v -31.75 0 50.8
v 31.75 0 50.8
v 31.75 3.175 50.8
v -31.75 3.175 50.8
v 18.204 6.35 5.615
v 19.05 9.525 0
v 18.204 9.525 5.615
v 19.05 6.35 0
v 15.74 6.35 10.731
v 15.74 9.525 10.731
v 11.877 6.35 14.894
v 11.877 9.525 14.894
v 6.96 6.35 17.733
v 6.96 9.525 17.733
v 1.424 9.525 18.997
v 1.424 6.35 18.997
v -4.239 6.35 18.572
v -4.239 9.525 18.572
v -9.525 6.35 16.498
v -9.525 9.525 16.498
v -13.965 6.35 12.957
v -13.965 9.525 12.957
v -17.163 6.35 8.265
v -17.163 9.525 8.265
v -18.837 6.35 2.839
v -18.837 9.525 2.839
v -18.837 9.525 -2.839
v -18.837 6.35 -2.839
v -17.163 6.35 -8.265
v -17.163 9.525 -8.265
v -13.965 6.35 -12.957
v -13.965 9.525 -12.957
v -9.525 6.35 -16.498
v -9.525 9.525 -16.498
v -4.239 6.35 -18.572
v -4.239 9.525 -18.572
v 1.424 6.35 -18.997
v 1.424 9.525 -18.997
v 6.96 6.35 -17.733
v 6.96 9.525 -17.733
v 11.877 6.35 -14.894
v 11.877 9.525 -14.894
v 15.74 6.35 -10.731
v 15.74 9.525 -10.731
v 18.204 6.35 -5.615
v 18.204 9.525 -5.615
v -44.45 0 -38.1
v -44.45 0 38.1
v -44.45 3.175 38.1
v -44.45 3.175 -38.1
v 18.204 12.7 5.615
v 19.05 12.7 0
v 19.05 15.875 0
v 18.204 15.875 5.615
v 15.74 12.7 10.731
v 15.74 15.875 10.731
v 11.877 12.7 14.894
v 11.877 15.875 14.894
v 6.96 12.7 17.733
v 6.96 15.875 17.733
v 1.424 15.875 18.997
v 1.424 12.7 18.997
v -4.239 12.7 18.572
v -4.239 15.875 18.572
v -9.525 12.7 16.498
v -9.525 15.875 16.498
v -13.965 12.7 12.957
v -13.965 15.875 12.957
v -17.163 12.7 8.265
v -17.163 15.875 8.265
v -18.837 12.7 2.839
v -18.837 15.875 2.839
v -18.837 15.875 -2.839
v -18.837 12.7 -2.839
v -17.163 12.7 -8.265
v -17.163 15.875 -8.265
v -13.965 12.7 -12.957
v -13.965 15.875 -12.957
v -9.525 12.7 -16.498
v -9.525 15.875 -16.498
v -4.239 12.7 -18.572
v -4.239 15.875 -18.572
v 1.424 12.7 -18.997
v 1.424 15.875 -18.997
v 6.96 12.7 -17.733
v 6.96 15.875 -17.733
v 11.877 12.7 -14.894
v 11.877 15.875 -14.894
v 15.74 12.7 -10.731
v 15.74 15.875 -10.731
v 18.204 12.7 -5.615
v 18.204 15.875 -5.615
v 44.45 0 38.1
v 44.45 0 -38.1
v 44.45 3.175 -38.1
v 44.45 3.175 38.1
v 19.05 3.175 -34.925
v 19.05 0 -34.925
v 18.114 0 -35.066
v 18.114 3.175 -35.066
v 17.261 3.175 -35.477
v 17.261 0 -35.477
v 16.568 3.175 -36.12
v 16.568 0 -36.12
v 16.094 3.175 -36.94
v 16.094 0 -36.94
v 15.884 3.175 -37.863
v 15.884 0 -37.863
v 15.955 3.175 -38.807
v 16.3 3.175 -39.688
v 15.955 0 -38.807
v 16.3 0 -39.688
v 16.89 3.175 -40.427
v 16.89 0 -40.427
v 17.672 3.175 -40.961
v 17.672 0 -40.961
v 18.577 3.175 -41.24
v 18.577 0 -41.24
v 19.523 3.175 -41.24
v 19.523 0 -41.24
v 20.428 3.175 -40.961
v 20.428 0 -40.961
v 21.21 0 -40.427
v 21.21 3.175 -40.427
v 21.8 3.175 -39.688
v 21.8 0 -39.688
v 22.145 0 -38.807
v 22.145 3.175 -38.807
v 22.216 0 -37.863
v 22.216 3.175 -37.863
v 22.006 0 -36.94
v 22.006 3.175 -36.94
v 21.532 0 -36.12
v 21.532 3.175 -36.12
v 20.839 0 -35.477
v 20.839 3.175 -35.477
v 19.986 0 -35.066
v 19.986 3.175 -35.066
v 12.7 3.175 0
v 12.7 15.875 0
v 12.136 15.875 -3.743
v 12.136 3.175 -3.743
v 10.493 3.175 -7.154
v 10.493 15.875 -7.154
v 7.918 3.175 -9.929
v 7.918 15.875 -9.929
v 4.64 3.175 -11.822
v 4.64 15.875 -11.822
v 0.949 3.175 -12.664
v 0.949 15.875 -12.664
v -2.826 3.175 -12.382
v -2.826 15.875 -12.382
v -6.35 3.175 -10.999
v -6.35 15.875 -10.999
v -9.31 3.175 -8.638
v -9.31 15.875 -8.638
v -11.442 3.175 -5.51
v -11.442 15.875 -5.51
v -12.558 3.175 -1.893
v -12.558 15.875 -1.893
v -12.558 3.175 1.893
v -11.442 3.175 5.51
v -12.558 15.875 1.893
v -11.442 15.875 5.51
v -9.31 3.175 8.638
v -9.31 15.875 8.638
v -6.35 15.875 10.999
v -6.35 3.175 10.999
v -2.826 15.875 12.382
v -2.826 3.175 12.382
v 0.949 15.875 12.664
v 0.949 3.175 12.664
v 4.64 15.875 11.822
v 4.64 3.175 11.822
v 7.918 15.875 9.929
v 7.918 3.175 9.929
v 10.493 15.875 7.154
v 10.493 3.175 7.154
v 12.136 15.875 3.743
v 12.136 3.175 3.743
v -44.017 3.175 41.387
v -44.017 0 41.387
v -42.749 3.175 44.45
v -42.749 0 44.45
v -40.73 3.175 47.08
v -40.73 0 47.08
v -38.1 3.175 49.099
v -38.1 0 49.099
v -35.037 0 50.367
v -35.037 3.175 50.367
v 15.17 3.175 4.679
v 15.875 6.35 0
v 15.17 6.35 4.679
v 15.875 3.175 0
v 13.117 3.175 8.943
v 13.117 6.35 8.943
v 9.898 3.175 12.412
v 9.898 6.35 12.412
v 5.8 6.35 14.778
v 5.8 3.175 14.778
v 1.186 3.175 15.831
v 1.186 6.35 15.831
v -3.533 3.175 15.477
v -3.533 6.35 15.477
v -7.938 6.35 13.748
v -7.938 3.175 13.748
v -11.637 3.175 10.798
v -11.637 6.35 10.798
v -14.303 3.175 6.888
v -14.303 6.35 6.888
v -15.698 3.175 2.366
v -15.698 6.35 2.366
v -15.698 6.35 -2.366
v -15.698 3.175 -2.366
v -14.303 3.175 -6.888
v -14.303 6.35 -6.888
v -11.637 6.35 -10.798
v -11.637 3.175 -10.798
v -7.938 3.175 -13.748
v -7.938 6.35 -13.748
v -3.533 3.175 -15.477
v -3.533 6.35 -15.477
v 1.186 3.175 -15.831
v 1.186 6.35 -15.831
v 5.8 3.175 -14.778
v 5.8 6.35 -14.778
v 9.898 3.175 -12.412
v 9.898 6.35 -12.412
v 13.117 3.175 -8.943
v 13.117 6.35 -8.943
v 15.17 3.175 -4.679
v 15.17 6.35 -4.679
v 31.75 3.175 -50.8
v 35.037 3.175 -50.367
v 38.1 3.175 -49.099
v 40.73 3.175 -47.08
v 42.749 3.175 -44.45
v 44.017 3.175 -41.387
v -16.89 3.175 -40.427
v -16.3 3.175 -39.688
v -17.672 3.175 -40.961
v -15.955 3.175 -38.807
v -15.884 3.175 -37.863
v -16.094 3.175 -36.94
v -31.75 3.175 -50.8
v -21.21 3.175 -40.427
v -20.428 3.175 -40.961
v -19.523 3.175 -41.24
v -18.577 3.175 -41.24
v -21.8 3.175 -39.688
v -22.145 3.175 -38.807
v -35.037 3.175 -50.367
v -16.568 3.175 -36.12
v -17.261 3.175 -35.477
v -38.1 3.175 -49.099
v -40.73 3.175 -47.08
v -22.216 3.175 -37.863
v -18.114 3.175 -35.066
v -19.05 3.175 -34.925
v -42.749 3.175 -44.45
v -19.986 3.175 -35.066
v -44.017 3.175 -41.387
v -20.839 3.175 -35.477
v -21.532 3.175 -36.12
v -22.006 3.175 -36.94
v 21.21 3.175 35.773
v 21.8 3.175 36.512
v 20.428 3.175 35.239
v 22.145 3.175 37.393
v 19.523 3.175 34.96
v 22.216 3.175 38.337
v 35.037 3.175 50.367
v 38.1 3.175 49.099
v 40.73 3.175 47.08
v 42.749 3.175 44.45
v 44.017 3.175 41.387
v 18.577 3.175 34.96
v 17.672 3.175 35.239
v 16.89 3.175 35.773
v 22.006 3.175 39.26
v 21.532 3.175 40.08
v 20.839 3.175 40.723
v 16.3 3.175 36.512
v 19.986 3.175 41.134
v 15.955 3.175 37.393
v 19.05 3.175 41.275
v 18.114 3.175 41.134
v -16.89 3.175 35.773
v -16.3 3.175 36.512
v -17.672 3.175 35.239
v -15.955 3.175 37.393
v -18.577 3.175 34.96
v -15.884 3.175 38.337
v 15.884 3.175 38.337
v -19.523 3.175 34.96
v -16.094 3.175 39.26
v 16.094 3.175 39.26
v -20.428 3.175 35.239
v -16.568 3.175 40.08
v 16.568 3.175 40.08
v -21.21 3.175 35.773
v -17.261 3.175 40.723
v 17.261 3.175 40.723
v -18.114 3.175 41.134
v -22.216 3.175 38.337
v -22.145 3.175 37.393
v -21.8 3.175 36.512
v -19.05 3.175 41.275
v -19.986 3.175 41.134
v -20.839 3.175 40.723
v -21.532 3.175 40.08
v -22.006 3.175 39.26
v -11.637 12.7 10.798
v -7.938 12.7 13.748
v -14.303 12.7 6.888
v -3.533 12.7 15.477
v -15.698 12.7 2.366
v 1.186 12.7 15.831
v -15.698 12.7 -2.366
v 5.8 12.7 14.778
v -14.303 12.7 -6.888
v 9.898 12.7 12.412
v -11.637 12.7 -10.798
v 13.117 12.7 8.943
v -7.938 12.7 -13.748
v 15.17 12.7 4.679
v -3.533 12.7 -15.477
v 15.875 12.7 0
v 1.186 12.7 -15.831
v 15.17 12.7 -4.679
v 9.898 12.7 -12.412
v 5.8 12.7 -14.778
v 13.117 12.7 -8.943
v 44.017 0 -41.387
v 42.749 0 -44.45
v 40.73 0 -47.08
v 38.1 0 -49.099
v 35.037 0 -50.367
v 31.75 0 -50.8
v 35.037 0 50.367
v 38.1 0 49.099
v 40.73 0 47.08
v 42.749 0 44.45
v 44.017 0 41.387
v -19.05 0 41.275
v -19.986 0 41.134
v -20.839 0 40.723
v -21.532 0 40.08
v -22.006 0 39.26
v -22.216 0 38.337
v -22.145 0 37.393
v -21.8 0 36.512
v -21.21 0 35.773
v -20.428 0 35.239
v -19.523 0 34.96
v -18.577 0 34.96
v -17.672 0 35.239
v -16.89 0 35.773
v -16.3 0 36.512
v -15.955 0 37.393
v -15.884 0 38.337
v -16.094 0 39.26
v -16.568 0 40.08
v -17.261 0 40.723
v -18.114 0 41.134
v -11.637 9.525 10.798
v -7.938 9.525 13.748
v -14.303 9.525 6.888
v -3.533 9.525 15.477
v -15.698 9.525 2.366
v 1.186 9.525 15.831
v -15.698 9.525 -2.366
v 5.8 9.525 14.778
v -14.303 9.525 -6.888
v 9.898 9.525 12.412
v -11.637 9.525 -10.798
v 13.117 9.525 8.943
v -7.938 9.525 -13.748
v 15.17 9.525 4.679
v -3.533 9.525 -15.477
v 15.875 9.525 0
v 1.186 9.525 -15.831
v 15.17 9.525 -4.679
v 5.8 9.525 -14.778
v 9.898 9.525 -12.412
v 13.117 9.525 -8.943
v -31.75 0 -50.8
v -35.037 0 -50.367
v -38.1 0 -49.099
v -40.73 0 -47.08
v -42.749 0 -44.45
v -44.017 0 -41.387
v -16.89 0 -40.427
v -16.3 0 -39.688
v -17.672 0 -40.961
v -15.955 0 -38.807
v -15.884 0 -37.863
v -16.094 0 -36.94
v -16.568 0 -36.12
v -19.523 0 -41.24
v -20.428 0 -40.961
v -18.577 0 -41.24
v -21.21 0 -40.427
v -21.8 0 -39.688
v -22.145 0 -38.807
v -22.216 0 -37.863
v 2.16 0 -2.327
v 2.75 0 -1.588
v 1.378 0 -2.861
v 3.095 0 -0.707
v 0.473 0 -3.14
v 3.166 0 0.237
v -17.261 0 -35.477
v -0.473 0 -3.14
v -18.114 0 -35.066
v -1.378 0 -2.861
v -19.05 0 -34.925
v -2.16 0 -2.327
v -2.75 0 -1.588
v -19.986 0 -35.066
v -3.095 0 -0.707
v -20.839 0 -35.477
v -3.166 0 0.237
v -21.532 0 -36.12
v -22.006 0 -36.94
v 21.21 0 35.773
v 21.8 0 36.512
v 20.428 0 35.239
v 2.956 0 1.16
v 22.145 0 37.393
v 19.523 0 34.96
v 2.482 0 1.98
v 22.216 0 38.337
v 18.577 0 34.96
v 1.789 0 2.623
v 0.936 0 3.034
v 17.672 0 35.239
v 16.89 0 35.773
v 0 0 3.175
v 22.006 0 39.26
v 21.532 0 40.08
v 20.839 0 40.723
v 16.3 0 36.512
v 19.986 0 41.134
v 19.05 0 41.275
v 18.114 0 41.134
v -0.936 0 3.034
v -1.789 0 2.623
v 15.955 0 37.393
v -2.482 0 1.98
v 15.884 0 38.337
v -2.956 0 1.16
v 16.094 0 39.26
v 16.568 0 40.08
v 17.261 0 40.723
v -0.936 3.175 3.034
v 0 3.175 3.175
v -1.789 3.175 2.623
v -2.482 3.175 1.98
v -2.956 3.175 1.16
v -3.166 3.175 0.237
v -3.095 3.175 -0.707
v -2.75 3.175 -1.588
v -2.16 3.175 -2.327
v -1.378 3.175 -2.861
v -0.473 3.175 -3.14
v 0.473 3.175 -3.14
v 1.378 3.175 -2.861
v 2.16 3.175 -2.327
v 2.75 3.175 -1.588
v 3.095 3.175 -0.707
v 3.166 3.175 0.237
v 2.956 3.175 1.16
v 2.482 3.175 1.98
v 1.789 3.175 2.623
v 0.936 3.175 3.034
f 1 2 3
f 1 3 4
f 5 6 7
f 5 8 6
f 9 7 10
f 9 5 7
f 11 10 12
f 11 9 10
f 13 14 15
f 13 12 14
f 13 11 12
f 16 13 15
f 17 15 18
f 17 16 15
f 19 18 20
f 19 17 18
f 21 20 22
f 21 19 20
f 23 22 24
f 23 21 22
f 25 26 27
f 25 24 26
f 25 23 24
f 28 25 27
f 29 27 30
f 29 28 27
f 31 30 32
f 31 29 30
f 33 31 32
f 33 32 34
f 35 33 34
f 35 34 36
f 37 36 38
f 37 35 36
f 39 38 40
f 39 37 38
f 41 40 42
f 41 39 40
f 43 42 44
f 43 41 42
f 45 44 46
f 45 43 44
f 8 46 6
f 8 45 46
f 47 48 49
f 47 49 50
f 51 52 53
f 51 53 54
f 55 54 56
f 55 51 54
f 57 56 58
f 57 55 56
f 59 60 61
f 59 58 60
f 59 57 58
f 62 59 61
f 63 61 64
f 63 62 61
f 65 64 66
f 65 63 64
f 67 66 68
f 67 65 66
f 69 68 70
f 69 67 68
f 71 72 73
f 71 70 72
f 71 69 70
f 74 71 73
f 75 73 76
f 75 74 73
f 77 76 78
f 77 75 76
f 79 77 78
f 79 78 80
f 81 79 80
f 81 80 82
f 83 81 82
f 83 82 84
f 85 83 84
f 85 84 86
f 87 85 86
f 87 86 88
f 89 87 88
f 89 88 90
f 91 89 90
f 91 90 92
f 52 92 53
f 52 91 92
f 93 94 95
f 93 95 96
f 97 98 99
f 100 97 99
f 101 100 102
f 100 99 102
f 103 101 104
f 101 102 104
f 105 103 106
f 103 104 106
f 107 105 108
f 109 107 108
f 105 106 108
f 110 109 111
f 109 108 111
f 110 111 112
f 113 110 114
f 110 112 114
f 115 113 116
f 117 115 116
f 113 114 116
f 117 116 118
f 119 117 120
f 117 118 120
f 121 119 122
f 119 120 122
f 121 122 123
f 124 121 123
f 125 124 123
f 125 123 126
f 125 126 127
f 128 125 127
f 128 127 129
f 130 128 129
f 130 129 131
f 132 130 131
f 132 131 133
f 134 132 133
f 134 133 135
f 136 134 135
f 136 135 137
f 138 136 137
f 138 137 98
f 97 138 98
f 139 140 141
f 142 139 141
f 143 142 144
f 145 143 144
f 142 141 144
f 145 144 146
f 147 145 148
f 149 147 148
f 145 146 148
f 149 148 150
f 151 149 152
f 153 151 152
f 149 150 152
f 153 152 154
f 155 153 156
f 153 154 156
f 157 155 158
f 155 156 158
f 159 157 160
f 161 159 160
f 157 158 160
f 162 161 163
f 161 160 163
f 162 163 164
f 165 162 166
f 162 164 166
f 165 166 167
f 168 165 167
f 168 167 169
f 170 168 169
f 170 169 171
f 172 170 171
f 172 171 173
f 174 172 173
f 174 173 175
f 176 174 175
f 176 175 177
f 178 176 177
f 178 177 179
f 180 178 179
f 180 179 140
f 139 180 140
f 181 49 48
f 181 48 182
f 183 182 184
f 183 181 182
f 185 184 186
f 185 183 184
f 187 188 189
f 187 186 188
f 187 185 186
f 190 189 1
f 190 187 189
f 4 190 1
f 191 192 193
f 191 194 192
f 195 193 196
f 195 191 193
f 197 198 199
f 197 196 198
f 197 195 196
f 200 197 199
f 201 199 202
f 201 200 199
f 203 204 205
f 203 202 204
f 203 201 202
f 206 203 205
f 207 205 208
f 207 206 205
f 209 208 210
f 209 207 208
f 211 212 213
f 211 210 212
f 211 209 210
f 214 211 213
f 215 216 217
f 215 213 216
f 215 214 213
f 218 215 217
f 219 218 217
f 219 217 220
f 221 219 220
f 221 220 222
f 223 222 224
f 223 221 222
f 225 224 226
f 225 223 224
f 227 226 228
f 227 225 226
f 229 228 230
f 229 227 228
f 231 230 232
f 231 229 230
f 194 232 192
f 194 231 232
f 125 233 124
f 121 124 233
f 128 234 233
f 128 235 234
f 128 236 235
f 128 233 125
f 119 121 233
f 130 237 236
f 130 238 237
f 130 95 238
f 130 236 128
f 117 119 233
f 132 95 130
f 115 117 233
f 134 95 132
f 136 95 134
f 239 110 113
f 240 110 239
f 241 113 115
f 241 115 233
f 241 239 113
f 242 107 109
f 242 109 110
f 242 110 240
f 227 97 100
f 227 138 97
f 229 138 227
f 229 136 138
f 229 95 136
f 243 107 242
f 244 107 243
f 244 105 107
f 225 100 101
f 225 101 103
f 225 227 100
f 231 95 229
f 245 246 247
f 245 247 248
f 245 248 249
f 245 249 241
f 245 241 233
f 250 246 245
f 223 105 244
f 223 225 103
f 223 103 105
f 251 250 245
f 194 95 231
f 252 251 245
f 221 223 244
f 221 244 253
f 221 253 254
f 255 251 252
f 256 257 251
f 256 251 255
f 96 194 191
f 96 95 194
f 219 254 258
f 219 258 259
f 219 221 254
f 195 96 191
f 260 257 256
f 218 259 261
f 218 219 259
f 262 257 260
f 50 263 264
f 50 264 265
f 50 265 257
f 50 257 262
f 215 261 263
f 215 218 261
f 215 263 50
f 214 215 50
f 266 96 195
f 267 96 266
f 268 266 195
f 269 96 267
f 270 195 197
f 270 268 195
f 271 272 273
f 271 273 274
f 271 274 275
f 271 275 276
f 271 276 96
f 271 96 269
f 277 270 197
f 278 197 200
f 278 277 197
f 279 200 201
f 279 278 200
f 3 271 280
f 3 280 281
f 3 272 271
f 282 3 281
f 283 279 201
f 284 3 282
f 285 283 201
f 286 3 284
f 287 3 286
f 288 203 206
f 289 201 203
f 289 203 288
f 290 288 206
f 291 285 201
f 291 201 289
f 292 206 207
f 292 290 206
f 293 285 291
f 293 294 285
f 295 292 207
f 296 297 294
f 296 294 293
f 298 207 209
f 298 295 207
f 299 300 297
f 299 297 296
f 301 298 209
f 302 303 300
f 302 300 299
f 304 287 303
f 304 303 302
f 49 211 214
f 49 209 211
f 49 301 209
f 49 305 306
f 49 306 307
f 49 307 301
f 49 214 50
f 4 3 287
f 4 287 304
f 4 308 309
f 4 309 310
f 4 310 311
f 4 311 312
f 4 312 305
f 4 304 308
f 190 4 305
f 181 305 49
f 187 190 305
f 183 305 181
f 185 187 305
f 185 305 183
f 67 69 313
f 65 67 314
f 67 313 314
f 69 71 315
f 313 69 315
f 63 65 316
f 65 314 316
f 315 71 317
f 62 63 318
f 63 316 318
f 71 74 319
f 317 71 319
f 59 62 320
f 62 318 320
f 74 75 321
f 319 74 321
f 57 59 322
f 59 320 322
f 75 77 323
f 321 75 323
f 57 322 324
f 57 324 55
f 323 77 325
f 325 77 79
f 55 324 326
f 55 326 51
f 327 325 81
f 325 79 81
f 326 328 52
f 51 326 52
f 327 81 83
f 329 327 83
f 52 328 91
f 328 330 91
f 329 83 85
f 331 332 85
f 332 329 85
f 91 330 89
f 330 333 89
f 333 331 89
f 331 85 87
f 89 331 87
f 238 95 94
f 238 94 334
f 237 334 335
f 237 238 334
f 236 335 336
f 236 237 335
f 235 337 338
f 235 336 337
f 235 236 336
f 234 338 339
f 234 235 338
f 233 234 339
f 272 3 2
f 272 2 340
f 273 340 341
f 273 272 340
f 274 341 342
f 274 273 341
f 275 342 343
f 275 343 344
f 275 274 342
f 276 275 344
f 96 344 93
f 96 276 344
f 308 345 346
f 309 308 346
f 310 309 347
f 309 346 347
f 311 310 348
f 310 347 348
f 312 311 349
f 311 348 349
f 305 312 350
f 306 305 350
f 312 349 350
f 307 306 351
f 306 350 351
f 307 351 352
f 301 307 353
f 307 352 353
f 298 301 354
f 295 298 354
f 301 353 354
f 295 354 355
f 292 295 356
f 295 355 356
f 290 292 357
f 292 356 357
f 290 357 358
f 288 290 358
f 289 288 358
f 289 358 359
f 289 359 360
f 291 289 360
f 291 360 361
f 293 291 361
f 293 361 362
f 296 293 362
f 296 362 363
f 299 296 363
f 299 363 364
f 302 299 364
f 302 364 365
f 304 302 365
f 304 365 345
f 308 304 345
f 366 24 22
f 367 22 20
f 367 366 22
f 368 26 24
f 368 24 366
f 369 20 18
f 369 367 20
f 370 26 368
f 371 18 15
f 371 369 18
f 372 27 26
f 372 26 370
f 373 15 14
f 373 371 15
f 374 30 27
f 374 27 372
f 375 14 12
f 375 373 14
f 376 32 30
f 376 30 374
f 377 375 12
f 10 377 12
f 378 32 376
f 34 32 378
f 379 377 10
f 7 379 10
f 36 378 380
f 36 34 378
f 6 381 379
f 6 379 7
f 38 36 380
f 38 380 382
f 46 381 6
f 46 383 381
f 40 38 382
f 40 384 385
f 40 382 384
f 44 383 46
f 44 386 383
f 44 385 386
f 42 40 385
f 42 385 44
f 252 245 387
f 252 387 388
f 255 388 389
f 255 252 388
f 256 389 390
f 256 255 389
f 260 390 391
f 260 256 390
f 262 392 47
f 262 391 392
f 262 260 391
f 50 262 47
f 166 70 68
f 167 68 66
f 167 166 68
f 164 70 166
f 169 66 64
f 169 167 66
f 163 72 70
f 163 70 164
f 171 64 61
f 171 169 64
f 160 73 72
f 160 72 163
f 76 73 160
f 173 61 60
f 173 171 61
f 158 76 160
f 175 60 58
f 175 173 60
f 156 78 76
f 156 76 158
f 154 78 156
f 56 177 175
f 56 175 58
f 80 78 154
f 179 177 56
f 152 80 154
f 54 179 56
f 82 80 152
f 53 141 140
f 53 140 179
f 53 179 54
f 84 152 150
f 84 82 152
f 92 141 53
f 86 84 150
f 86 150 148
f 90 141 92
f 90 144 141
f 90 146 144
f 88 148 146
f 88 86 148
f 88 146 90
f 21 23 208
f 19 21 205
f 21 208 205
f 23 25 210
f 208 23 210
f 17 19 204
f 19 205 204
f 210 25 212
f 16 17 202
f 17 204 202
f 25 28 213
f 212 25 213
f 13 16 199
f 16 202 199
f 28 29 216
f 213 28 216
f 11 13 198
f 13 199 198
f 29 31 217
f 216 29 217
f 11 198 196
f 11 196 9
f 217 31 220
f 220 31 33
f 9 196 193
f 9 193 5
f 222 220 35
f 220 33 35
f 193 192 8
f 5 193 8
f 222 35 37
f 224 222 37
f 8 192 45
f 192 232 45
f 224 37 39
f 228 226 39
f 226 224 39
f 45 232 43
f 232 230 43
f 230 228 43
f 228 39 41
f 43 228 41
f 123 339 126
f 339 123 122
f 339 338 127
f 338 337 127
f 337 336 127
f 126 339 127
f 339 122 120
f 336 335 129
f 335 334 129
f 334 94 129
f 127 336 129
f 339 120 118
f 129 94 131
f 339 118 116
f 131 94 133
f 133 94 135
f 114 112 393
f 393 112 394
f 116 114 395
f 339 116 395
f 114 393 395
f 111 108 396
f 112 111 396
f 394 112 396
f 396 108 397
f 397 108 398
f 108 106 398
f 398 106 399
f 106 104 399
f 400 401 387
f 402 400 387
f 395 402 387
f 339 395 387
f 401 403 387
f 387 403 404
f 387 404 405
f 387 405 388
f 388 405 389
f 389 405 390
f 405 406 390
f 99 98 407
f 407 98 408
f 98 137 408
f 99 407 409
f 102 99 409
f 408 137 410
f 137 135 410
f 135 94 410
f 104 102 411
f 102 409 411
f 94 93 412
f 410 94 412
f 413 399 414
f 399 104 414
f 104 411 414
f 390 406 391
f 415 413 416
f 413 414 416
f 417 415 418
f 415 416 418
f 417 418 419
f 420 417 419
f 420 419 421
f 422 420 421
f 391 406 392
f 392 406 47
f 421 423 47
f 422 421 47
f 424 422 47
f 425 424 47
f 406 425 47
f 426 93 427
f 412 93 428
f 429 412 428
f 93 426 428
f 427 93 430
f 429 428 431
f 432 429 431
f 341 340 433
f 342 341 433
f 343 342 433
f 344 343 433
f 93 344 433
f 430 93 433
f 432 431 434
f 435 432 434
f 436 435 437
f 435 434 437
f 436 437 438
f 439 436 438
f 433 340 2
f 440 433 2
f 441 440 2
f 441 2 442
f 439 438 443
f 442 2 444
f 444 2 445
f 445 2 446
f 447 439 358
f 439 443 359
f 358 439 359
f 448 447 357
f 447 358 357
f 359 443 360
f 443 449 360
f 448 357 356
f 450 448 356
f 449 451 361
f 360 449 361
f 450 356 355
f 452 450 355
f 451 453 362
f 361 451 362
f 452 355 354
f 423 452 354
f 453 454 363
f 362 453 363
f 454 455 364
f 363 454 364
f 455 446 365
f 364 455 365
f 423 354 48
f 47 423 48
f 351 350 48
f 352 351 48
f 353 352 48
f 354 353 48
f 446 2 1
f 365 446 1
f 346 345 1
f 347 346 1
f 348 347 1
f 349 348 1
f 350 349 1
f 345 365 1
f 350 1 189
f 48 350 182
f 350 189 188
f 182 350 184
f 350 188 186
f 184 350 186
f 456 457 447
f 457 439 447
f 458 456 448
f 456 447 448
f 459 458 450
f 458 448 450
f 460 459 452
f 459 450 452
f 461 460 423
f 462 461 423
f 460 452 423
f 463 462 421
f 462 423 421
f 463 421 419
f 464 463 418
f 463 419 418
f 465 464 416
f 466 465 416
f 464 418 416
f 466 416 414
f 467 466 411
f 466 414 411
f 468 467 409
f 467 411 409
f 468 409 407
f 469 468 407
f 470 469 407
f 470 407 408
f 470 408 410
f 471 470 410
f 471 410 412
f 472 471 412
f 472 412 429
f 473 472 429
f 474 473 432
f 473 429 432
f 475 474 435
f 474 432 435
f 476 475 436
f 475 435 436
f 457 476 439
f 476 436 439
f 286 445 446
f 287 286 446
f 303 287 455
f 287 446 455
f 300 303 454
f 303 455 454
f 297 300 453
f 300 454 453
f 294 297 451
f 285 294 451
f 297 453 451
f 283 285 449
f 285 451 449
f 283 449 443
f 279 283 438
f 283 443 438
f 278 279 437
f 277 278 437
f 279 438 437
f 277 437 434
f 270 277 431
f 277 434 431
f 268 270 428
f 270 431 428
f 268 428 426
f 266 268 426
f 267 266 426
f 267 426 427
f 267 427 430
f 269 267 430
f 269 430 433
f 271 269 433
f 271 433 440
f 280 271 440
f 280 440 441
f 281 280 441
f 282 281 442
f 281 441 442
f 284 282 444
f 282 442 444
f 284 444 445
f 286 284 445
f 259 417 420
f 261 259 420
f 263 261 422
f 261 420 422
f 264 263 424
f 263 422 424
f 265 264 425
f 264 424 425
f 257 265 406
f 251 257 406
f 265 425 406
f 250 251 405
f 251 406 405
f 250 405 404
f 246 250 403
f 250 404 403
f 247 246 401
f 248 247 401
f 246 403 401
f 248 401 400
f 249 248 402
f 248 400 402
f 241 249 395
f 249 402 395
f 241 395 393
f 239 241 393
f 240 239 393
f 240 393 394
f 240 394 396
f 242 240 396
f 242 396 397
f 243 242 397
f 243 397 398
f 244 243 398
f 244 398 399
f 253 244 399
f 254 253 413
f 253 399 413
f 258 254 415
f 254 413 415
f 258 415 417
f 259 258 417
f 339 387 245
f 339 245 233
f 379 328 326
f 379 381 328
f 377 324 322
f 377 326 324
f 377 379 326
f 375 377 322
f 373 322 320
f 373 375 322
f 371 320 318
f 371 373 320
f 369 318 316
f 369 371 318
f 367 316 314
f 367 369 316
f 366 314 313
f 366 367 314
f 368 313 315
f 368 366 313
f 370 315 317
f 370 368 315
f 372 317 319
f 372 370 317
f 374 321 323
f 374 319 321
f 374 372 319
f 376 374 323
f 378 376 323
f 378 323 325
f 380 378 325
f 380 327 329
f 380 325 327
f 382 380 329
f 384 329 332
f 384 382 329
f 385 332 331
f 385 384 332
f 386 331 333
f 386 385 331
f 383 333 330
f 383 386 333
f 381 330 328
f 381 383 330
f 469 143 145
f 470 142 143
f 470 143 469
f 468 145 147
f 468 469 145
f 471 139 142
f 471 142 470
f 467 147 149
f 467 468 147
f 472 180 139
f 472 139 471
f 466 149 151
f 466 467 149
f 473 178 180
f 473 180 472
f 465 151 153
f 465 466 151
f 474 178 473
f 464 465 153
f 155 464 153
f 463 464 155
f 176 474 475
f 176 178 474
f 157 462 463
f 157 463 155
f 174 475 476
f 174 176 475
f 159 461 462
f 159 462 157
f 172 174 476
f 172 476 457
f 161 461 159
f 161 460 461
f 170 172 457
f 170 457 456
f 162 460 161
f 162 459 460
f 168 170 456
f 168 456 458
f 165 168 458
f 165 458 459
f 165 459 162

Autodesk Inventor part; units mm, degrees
ref_plane "YZ Plane" through (0, 0, 0) normal (1, 0, 0) x (0, 1, 0)
ref_plane "XZ Plane" through (0, 0, 0) normal (0, 1, 0) x (-1, 0, 0)
ref_plane "XY Plane" through (0, 0, 0) normal (0, 0, 1) x (1, 0, 0)
sketch "Sketch2" plane through (0, 0, 0) normal (0, 1, 0) x (-1, 0, 0)
  line L0 (-44.45, 50.8) -> (44.45, 50.8)
  line L1 (44.45, 50.8) -> (44.45, -50.8)
  line L2 (44.45, -50.8) -> (-44.45, -50.8)
  line L3 (-44.45, -50.8) -> (-44.45, 50.8)
  point P0 (0, 0)
  dimension "d0" = 44.45
  dimension "d1" = 44.45
  dimension "d2" = 50.8
  dimension "d3" = 50.8
extrude "Extrusion1" add sketch "Sketch2" along normal blind 3.175
fillet "Fillet1" radius 12.7 4 edges at (44.45, 1.5875, 50.8) (44.45, 1.5875, -50.8) (-44.45, 1.5875, 50.8) (-44.45, 1.5875, -50.8)
sketch "Sketch3" plane through (0, 3.175, 0) normal (0, 1, 0) x (1, 0, 0)
  line L0 (-44.45, -38.1) -> (-44.45, 38.1) projected
  line L1 (31.75, -50.8) -> (-31.75, -50.8) projected
  line L2 (44.45, 38.1) -> (44.45, -38.1) projected
  line L3 (-31.75, 50.8) -> (31.75, 50.8) projected
  point P0 (0, 0)
  point P1 (0, 0)
  point P2 (-19.05, 38.1)
  point P3 (19.05, 38.1)
  point P4 (19.05, -38.1)
  point P5 (-19.05, -38.1)
  dimension "d7" = 12.7
  dimension "d8" = 25.4
  dimension "d9" = 12.7
  dimension "d10" = 25.4
hole "Hole1" at (0, 3.175, 0) at (-19.05, 3.175, -38.1) at (19.05, 3.175, -38.1) at (19.05, 3.175, 38.1) at (-19.05, 3.175, 38.1) direction (0, -1, 0) diameter 6.35 end through all
sketch "Sketch4" plane through (0, 0, 0) normal (0, 0, 1) x (1, 0, 0)
  line L0 (12.7, 3.175) -> (12.7, 15.875)
  line L1 (12.7, 15.875) -> (19.05, 15.875)
  line L2 (19.05, 15.875) -> (19.05, 12.7)
  line L3 (19.05, 12.7) -> (15.875, 12.7)
  line L4 (15.875, 3.175) -> (12.7, 3.175)
  line L5 (15.875, 3.175) -> (12.7, 3.175)
  line L6 (15.875, 12.7) -> (15.875, 9.525)
  line L7 (15.875, 9.525) -> (19.05, 9.525)
  line L8 (19.05, 9.525) -> (19.05, 6.35)
  line L9 (19.05, 6.35) -> (15.875, 6.35)
  line L10 (15.875, 6.35) -> (15.875, 3.175)
  line L11 (15.875, 3.175) -> (12.7, 3.175)
  line L12 (0, -3.175) -> (0, 19.05) projected
  point P0 (0, 0)
  dimension "d18" = 12.7
  dimension "d19" = 6.35
  dimension "d20" = 3.175
  dimension "d21" = 3.175
  dimension "d22" = 9.525
  dimension "d23" = 12.7
  dimension "d24" = 3.175
  dimension "d25" = 3.175
  dimension "d26" = 3.175
  dimension "d27" = 3.175
  dimension "d28" = 3.175
revolve "Revolution1" add sketch "Sketch4" angle 360 about axis through (0, -10, 0) along (0, 1, 0)
equation "\"d1\" = d0"
equation "\"d3\" = d2"
equation "\"d4\" = metalThickness"
equation "\"metalThickness\" = 3.175"
properties part number "Rotation Base" material "Aluminum-6061"
